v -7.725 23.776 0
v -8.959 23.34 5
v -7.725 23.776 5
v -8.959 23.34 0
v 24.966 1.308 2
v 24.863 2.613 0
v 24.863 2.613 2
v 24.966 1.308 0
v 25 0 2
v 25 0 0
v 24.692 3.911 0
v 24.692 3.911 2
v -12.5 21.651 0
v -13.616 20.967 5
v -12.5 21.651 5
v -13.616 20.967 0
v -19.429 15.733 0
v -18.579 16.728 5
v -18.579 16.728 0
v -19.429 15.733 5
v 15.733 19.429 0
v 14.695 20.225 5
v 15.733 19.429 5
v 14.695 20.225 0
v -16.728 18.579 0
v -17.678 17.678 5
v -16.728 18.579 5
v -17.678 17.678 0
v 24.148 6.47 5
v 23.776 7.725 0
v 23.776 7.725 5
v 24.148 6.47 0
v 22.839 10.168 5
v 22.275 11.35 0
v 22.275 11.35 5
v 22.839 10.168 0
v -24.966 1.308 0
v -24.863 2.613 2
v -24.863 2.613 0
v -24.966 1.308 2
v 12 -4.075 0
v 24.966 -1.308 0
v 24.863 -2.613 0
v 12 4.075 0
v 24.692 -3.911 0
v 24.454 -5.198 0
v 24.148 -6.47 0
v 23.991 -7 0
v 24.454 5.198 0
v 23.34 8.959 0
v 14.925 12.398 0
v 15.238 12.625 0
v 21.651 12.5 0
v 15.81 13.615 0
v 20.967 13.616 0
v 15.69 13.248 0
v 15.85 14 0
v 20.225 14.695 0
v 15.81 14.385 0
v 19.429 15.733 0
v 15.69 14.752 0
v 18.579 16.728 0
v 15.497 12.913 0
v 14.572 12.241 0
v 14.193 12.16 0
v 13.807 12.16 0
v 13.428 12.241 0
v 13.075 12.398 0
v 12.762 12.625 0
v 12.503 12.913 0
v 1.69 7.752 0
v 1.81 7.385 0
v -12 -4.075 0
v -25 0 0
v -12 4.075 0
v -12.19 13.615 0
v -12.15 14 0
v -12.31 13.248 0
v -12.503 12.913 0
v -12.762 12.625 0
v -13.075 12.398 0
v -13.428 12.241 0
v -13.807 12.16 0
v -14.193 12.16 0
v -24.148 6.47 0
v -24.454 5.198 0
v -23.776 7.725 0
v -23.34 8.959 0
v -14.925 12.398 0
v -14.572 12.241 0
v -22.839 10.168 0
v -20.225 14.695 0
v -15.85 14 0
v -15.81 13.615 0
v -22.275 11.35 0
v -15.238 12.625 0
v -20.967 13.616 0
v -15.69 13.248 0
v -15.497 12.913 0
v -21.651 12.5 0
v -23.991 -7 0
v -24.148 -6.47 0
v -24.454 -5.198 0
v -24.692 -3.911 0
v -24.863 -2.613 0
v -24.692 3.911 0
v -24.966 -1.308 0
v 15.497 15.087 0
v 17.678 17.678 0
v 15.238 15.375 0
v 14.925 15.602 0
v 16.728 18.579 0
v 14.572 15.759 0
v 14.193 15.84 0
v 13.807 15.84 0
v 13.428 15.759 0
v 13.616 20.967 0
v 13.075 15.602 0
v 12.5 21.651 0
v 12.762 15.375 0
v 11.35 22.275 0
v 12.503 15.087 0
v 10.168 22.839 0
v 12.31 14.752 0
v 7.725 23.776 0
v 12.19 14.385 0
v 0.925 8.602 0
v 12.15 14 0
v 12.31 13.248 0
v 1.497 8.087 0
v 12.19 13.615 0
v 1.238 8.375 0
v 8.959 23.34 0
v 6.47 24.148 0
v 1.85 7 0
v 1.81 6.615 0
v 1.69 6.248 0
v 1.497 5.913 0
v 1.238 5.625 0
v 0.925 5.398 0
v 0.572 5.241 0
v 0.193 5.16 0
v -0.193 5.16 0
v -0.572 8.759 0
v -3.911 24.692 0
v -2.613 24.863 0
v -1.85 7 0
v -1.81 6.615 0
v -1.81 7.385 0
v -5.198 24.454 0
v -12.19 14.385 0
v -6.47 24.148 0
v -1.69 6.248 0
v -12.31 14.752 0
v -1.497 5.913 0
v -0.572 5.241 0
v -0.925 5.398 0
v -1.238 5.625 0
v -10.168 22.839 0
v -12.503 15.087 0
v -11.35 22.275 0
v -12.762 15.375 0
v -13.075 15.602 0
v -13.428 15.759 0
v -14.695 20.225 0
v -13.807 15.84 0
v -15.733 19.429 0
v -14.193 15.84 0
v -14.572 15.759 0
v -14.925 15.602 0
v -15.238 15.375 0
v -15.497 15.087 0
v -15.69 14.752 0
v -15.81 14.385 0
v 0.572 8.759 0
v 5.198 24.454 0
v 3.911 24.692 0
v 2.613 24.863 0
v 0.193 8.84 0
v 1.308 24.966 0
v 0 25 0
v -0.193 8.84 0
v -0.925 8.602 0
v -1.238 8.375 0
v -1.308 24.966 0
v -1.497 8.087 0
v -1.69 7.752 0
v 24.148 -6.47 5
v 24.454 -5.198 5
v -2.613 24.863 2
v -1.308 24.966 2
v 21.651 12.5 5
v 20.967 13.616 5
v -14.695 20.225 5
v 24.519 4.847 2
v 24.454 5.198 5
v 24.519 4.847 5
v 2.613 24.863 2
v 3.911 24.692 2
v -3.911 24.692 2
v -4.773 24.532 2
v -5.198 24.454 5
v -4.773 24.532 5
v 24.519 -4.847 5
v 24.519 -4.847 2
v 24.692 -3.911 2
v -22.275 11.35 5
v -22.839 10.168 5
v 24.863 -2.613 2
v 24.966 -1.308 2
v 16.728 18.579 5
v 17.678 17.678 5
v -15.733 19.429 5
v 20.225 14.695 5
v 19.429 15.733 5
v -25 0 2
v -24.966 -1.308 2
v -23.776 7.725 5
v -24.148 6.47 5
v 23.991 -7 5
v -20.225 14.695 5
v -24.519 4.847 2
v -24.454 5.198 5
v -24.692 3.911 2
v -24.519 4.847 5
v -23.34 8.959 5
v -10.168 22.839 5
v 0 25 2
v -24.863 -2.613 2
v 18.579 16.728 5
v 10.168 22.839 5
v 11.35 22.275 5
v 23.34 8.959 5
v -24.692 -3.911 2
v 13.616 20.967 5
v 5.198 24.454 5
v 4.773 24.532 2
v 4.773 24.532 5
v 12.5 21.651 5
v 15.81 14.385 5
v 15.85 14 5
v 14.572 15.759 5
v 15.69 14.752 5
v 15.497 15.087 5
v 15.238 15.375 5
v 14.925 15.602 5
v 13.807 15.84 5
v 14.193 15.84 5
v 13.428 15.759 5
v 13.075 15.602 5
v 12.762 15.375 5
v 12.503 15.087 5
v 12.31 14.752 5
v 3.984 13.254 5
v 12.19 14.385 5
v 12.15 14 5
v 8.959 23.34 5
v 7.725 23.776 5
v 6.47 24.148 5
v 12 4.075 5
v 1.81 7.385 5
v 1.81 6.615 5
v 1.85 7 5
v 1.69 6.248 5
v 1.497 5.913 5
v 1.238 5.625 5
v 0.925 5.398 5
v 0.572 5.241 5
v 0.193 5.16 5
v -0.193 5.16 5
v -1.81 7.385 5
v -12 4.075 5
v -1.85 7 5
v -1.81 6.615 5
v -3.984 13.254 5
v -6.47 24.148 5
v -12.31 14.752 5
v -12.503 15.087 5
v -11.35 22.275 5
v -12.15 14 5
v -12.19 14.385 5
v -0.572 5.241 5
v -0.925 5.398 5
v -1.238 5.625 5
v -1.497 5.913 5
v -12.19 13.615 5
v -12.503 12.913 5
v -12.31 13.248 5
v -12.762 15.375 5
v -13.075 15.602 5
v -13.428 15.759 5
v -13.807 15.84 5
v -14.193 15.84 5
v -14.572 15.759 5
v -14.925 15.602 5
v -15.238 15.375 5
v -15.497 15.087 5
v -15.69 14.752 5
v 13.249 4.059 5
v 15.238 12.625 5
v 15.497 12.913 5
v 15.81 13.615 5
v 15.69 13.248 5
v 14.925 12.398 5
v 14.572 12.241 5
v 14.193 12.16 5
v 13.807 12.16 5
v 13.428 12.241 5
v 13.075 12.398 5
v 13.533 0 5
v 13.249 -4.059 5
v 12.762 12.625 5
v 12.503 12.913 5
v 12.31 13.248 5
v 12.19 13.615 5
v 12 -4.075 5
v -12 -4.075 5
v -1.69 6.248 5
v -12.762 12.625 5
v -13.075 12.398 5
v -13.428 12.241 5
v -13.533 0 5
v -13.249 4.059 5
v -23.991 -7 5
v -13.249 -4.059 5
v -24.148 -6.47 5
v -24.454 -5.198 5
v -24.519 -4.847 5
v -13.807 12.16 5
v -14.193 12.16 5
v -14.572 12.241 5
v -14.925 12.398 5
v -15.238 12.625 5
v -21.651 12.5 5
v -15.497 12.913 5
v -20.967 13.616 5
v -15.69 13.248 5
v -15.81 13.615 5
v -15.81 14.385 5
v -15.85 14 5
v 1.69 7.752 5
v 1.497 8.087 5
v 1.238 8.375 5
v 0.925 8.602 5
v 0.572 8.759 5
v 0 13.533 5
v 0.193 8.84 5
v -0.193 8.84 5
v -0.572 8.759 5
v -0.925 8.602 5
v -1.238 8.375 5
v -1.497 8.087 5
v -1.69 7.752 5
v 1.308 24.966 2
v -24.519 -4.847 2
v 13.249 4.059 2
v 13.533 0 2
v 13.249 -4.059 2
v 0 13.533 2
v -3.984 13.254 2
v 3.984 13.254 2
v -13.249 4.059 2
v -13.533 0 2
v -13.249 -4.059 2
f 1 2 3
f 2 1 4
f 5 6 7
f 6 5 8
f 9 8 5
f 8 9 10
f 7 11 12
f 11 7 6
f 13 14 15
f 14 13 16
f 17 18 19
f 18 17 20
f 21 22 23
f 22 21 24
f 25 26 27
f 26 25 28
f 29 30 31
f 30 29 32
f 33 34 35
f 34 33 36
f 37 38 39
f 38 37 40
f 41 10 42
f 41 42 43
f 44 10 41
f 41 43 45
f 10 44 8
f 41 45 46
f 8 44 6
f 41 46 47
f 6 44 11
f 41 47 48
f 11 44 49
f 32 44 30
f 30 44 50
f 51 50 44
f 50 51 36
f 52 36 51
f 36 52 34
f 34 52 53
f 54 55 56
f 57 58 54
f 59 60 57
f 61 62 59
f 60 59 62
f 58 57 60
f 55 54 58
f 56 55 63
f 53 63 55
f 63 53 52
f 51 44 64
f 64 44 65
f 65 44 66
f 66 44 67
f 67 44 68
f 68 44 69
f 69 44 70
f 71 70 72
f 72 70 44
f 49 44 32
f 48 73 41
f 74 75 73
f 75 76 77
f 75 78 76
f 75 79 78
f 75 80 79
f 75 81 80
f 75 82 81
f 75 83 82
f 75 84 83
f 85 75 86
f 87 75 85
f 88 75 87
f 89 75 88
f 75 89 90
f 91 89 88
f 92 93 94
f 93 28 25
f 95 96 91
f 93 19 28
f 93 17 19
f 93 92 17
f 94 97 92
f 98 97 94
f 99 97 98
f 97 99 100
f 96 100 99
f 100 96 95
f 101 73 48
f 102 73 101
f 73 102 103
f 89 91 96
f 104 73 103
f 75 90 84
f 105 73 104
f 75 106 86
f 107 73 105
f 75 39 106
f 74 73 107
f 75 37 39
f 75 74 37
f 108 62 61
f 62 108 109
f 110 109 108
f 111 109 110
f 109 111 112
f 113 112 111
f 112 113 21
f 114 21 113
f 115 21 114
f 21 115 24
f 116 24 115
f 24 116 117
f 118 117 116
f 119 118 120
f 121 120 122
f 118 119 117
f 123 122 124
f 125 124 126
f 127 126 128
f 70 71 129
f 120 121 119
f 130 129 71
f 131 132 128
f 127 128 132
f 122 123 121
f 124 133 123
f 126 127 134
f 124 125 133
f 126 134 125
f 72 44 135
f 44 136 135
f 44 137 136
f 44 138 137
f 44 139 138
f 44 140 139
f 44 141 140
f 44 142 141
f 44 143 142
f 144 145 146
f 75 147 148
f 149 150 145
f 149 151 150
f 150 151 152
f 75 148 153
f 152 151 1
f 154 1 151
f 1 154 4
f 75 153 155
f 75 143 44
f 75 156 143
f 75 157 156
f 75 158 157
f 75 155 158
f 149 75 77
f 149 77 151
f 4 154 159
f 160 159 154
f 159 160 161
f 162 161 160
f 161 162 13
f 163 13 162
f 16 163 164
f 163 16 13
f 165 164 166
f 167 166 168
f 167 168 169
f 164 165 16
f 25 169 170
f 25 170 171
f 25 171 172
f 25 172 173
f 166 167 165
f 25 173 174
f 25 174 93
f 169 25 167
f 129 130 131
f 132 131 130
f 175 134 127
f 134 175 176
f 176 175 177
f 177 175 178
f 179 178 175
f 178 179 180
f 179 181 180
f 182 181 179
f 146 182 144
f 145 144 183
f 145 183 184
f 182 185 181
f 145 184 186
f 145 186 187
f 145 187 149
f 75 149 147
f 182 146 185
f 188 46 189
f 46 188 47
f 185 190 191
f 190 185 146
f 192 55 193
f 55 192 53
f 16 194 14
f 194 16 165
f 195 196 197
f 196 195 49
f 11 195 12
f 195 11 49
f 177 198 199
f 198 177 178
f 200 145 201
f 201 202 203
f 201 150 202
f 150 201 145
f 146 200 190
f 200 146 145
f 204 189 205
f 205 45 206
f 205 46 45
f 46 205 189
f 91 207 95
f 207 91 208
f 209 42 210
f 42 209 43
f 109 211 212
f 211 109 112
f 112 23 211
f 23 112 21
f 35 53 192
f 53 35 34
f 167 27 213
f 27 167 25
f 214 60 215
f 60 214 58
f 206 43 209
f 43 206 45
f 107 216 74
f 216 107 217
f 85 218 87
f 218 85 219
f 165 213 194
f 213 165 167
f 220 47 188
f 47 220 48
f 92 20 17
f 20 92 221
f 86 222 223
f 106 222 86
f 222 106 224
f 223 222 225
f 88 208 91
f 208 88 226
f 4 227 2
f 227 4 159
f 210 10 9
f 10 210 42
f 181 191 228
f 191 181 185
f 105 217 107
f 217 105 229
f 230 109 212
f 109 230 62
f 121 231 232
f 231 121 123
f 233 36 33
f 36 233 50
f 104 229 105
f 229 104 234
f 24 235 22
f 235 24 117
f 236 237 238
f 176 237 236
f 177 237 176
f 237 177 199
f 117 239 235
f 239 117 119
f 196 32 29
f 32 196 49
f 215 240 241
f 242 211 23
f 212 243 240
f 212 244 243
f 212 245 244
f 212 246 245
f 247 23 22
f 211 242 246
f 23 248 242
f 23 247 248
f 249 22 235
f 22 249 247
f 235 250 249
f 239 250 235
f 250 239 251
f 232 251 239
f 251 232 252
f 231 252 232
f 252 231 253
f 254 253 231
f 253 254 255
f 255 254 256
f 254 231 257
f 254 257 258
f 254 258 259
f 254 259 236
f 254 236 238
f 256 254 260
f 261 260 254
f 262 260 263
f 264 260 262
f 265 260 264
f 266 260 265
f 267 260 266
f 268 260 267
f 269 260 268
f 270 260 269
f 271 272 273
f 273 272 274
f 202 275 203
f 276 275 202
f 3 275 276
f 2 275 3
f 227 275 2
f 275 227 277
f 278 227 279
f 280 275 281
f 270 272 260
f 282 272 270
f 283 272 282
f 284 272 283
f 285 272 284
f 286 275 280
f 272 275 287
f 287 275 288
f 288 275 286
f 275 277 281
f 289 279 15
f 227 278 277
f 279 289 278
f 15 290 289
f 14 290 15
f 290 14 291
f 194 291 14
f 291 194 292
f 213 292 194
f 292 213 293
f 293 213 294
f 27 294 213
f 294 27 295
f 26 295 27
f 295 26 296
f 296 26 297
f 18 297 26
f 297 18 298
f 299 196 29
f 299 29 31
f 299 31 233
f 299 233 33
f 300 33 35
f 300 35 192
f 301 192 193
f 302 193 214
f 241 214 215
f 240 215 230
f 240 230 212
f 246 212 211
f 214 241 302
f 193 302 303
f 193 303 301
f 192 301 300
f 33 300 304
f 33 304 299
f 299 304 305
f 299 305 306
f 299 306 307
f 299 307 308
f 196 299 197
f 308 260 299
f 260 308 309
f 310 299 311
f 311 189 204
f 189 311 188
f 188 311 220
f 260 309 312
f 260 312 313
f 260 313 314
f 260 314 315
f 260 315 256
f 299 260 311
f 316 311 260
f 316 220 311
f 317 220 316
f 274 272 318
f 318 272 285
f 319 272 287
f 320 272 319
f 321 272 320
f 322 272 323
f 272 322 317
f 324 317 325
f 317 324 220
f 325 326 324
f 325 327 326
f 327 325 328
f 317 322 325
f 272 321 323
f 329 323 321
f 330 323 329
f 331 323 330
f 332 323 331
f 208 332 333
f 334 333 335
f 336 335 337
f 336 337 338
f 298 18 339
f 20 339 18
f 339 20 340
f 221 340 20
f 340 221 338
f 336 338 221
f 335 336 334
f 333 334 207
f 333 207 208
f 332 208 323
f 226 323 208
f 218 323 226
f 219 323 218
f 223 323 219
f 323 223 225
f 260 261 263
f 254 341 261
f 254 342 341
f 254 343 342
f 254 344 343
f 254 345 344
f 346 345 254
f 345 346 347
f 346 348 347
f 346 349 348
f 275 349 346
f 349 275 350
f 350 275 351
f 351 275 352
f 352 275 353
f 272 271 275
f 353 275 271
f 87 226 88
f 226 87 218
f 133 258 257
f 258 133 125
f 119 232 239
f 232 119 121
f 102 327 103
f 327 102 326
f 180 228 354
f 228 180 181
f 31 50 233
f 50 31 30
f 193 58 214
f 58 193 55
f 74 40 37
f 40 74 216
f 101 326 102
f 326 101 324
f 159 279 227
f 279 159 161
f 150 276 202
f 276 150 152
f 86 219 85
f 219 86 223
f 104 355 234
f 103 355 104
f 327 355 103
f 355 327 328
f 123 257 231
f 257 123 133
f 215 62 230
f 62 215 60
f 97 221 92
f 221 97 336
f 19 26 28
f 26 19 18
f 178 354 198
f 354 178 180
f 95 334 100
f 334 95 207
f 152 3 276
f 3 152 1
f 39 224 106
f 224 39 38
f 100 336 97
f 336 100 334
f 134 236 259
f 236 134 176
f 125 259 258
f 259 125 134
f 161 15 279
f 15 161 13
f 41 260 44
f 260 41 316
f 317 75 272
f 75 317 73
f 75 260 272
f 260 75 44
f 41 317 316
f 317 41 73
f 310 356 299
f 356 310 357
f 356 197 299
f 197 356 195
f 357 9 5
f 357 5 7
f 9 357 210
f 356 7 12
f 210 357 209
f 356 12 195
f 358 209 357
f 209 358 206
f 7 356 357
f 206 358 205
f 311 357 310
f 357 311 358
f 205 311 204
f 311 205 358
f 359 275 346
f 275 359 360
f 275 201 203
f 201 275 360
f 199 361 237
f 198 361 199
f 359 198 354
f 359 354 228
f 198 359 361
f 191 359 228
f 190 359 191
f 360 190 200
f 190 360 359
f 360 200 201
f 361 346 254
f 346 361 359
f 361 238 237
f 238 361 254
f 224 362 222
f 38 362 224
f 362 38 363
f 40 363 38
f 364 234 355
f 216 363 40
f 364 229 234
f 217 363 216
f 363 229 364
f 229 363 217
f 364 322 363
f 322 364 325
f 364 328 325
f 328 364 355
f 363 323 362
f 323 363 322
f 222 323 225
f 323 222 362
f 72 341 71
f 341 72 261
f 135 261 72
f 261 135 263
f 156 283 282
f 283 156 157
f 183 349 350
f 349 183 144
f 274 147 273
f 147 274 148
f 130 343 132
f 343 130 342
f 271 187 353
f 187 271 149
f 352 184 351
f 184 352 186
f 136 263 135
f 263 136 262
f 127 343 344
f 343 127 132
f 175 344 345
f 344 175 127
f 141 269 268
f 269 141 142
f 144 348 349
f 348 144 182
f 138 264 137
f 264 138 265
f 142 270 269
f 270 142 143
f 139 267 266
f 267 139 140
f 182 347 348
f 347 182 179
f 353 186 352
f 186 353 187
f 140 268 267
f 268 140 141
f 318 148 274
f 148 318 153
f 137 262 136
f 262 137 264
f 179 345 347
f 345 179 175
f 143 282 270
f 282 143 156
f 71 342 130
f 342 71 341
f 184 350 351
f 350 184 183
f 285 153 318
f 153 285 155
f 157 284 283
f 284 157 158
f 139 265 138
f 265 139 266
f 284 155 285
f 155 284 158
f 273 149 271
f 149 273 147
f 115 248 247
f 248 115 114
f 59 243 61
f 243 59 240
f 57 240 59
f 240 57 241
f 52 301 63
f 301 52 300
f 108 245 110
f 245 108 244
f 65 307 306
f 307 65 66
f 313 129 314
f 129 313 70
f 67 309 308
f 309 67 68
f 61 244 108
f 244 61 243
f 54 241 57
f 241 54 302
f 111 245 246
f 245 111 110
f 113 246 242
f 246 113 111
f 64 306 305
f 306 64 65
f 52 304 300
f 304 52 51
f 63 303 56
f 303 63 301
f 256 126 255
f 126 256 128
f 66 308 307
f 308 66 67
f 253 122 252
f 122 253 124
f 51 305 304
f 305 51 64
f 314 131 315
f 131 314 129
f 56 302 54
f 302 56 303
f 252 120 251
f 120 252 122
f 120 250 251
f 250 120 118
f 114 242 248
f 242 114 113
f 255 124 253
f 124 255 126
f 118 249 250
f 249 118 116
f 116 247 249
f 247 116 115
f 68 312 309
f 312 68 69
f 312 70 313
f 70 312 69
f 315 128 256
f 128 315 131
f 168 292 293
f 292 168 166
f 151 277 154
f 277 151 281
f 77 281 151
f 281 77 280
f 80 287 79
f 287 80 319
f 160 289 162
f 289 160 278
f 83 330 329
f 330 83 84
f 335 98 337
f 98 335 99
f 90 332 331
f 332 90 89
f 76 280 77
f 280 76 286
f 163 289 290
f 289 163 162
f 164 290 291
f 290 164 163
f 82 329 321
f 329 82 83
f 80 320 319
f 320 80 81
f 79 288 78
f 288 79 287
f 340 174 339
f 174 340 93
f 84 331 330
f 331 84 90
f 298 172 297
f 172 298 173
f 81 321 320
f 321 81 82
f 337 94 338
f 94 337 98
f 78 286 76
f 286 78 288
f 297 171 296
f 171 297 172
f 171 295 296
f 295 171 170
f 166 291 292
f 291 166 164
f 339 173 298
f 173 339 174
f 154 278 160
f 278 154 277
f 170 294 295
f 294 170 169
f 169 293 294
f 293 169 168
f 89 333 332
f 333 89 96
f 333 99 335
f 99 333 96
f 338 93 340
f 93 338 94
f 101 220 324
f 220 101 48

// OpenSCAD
 difference(){

e=4; // holgura giro
ed=0.95; // holgura despazamiento

cylinder(d=50,h=5,$fn=120);
cube([24,8.15,12],center=true);

rotate([0,0,e])translate([25.5,-ed,8])
cube([24,8.15,12],center=true);
rotate([0,0,-e])translate([25.5,ed,8])
cube([24,8.15,12],center=true);

rotate([0,0,90+e])translate([25.5,-ed,8])
cube([24,8,12],center=true);
rotate([0,0,90-e])translate([25.5,ed,8])
cube([24,8,12],center=true);

rotate([0,0,180+e])translate([25.5,-ed,8])
cube([24,8.15,12],center=true);
rotate([0,0,180-e])translate([25.5,ed,8])
cube([24,8.15,12],center=true);

translate([0,7,-1])cylinder(d=3.7,h=10,$fn=30);
translate([14,14,-1])cylinder(d=3.7,h=10,$fn=30);
translate([-14,14,-1])cylinder(d=3.7,h=10,$fn=30);

translate([0,-31,0])cube([54,48,12],center=true);
}
